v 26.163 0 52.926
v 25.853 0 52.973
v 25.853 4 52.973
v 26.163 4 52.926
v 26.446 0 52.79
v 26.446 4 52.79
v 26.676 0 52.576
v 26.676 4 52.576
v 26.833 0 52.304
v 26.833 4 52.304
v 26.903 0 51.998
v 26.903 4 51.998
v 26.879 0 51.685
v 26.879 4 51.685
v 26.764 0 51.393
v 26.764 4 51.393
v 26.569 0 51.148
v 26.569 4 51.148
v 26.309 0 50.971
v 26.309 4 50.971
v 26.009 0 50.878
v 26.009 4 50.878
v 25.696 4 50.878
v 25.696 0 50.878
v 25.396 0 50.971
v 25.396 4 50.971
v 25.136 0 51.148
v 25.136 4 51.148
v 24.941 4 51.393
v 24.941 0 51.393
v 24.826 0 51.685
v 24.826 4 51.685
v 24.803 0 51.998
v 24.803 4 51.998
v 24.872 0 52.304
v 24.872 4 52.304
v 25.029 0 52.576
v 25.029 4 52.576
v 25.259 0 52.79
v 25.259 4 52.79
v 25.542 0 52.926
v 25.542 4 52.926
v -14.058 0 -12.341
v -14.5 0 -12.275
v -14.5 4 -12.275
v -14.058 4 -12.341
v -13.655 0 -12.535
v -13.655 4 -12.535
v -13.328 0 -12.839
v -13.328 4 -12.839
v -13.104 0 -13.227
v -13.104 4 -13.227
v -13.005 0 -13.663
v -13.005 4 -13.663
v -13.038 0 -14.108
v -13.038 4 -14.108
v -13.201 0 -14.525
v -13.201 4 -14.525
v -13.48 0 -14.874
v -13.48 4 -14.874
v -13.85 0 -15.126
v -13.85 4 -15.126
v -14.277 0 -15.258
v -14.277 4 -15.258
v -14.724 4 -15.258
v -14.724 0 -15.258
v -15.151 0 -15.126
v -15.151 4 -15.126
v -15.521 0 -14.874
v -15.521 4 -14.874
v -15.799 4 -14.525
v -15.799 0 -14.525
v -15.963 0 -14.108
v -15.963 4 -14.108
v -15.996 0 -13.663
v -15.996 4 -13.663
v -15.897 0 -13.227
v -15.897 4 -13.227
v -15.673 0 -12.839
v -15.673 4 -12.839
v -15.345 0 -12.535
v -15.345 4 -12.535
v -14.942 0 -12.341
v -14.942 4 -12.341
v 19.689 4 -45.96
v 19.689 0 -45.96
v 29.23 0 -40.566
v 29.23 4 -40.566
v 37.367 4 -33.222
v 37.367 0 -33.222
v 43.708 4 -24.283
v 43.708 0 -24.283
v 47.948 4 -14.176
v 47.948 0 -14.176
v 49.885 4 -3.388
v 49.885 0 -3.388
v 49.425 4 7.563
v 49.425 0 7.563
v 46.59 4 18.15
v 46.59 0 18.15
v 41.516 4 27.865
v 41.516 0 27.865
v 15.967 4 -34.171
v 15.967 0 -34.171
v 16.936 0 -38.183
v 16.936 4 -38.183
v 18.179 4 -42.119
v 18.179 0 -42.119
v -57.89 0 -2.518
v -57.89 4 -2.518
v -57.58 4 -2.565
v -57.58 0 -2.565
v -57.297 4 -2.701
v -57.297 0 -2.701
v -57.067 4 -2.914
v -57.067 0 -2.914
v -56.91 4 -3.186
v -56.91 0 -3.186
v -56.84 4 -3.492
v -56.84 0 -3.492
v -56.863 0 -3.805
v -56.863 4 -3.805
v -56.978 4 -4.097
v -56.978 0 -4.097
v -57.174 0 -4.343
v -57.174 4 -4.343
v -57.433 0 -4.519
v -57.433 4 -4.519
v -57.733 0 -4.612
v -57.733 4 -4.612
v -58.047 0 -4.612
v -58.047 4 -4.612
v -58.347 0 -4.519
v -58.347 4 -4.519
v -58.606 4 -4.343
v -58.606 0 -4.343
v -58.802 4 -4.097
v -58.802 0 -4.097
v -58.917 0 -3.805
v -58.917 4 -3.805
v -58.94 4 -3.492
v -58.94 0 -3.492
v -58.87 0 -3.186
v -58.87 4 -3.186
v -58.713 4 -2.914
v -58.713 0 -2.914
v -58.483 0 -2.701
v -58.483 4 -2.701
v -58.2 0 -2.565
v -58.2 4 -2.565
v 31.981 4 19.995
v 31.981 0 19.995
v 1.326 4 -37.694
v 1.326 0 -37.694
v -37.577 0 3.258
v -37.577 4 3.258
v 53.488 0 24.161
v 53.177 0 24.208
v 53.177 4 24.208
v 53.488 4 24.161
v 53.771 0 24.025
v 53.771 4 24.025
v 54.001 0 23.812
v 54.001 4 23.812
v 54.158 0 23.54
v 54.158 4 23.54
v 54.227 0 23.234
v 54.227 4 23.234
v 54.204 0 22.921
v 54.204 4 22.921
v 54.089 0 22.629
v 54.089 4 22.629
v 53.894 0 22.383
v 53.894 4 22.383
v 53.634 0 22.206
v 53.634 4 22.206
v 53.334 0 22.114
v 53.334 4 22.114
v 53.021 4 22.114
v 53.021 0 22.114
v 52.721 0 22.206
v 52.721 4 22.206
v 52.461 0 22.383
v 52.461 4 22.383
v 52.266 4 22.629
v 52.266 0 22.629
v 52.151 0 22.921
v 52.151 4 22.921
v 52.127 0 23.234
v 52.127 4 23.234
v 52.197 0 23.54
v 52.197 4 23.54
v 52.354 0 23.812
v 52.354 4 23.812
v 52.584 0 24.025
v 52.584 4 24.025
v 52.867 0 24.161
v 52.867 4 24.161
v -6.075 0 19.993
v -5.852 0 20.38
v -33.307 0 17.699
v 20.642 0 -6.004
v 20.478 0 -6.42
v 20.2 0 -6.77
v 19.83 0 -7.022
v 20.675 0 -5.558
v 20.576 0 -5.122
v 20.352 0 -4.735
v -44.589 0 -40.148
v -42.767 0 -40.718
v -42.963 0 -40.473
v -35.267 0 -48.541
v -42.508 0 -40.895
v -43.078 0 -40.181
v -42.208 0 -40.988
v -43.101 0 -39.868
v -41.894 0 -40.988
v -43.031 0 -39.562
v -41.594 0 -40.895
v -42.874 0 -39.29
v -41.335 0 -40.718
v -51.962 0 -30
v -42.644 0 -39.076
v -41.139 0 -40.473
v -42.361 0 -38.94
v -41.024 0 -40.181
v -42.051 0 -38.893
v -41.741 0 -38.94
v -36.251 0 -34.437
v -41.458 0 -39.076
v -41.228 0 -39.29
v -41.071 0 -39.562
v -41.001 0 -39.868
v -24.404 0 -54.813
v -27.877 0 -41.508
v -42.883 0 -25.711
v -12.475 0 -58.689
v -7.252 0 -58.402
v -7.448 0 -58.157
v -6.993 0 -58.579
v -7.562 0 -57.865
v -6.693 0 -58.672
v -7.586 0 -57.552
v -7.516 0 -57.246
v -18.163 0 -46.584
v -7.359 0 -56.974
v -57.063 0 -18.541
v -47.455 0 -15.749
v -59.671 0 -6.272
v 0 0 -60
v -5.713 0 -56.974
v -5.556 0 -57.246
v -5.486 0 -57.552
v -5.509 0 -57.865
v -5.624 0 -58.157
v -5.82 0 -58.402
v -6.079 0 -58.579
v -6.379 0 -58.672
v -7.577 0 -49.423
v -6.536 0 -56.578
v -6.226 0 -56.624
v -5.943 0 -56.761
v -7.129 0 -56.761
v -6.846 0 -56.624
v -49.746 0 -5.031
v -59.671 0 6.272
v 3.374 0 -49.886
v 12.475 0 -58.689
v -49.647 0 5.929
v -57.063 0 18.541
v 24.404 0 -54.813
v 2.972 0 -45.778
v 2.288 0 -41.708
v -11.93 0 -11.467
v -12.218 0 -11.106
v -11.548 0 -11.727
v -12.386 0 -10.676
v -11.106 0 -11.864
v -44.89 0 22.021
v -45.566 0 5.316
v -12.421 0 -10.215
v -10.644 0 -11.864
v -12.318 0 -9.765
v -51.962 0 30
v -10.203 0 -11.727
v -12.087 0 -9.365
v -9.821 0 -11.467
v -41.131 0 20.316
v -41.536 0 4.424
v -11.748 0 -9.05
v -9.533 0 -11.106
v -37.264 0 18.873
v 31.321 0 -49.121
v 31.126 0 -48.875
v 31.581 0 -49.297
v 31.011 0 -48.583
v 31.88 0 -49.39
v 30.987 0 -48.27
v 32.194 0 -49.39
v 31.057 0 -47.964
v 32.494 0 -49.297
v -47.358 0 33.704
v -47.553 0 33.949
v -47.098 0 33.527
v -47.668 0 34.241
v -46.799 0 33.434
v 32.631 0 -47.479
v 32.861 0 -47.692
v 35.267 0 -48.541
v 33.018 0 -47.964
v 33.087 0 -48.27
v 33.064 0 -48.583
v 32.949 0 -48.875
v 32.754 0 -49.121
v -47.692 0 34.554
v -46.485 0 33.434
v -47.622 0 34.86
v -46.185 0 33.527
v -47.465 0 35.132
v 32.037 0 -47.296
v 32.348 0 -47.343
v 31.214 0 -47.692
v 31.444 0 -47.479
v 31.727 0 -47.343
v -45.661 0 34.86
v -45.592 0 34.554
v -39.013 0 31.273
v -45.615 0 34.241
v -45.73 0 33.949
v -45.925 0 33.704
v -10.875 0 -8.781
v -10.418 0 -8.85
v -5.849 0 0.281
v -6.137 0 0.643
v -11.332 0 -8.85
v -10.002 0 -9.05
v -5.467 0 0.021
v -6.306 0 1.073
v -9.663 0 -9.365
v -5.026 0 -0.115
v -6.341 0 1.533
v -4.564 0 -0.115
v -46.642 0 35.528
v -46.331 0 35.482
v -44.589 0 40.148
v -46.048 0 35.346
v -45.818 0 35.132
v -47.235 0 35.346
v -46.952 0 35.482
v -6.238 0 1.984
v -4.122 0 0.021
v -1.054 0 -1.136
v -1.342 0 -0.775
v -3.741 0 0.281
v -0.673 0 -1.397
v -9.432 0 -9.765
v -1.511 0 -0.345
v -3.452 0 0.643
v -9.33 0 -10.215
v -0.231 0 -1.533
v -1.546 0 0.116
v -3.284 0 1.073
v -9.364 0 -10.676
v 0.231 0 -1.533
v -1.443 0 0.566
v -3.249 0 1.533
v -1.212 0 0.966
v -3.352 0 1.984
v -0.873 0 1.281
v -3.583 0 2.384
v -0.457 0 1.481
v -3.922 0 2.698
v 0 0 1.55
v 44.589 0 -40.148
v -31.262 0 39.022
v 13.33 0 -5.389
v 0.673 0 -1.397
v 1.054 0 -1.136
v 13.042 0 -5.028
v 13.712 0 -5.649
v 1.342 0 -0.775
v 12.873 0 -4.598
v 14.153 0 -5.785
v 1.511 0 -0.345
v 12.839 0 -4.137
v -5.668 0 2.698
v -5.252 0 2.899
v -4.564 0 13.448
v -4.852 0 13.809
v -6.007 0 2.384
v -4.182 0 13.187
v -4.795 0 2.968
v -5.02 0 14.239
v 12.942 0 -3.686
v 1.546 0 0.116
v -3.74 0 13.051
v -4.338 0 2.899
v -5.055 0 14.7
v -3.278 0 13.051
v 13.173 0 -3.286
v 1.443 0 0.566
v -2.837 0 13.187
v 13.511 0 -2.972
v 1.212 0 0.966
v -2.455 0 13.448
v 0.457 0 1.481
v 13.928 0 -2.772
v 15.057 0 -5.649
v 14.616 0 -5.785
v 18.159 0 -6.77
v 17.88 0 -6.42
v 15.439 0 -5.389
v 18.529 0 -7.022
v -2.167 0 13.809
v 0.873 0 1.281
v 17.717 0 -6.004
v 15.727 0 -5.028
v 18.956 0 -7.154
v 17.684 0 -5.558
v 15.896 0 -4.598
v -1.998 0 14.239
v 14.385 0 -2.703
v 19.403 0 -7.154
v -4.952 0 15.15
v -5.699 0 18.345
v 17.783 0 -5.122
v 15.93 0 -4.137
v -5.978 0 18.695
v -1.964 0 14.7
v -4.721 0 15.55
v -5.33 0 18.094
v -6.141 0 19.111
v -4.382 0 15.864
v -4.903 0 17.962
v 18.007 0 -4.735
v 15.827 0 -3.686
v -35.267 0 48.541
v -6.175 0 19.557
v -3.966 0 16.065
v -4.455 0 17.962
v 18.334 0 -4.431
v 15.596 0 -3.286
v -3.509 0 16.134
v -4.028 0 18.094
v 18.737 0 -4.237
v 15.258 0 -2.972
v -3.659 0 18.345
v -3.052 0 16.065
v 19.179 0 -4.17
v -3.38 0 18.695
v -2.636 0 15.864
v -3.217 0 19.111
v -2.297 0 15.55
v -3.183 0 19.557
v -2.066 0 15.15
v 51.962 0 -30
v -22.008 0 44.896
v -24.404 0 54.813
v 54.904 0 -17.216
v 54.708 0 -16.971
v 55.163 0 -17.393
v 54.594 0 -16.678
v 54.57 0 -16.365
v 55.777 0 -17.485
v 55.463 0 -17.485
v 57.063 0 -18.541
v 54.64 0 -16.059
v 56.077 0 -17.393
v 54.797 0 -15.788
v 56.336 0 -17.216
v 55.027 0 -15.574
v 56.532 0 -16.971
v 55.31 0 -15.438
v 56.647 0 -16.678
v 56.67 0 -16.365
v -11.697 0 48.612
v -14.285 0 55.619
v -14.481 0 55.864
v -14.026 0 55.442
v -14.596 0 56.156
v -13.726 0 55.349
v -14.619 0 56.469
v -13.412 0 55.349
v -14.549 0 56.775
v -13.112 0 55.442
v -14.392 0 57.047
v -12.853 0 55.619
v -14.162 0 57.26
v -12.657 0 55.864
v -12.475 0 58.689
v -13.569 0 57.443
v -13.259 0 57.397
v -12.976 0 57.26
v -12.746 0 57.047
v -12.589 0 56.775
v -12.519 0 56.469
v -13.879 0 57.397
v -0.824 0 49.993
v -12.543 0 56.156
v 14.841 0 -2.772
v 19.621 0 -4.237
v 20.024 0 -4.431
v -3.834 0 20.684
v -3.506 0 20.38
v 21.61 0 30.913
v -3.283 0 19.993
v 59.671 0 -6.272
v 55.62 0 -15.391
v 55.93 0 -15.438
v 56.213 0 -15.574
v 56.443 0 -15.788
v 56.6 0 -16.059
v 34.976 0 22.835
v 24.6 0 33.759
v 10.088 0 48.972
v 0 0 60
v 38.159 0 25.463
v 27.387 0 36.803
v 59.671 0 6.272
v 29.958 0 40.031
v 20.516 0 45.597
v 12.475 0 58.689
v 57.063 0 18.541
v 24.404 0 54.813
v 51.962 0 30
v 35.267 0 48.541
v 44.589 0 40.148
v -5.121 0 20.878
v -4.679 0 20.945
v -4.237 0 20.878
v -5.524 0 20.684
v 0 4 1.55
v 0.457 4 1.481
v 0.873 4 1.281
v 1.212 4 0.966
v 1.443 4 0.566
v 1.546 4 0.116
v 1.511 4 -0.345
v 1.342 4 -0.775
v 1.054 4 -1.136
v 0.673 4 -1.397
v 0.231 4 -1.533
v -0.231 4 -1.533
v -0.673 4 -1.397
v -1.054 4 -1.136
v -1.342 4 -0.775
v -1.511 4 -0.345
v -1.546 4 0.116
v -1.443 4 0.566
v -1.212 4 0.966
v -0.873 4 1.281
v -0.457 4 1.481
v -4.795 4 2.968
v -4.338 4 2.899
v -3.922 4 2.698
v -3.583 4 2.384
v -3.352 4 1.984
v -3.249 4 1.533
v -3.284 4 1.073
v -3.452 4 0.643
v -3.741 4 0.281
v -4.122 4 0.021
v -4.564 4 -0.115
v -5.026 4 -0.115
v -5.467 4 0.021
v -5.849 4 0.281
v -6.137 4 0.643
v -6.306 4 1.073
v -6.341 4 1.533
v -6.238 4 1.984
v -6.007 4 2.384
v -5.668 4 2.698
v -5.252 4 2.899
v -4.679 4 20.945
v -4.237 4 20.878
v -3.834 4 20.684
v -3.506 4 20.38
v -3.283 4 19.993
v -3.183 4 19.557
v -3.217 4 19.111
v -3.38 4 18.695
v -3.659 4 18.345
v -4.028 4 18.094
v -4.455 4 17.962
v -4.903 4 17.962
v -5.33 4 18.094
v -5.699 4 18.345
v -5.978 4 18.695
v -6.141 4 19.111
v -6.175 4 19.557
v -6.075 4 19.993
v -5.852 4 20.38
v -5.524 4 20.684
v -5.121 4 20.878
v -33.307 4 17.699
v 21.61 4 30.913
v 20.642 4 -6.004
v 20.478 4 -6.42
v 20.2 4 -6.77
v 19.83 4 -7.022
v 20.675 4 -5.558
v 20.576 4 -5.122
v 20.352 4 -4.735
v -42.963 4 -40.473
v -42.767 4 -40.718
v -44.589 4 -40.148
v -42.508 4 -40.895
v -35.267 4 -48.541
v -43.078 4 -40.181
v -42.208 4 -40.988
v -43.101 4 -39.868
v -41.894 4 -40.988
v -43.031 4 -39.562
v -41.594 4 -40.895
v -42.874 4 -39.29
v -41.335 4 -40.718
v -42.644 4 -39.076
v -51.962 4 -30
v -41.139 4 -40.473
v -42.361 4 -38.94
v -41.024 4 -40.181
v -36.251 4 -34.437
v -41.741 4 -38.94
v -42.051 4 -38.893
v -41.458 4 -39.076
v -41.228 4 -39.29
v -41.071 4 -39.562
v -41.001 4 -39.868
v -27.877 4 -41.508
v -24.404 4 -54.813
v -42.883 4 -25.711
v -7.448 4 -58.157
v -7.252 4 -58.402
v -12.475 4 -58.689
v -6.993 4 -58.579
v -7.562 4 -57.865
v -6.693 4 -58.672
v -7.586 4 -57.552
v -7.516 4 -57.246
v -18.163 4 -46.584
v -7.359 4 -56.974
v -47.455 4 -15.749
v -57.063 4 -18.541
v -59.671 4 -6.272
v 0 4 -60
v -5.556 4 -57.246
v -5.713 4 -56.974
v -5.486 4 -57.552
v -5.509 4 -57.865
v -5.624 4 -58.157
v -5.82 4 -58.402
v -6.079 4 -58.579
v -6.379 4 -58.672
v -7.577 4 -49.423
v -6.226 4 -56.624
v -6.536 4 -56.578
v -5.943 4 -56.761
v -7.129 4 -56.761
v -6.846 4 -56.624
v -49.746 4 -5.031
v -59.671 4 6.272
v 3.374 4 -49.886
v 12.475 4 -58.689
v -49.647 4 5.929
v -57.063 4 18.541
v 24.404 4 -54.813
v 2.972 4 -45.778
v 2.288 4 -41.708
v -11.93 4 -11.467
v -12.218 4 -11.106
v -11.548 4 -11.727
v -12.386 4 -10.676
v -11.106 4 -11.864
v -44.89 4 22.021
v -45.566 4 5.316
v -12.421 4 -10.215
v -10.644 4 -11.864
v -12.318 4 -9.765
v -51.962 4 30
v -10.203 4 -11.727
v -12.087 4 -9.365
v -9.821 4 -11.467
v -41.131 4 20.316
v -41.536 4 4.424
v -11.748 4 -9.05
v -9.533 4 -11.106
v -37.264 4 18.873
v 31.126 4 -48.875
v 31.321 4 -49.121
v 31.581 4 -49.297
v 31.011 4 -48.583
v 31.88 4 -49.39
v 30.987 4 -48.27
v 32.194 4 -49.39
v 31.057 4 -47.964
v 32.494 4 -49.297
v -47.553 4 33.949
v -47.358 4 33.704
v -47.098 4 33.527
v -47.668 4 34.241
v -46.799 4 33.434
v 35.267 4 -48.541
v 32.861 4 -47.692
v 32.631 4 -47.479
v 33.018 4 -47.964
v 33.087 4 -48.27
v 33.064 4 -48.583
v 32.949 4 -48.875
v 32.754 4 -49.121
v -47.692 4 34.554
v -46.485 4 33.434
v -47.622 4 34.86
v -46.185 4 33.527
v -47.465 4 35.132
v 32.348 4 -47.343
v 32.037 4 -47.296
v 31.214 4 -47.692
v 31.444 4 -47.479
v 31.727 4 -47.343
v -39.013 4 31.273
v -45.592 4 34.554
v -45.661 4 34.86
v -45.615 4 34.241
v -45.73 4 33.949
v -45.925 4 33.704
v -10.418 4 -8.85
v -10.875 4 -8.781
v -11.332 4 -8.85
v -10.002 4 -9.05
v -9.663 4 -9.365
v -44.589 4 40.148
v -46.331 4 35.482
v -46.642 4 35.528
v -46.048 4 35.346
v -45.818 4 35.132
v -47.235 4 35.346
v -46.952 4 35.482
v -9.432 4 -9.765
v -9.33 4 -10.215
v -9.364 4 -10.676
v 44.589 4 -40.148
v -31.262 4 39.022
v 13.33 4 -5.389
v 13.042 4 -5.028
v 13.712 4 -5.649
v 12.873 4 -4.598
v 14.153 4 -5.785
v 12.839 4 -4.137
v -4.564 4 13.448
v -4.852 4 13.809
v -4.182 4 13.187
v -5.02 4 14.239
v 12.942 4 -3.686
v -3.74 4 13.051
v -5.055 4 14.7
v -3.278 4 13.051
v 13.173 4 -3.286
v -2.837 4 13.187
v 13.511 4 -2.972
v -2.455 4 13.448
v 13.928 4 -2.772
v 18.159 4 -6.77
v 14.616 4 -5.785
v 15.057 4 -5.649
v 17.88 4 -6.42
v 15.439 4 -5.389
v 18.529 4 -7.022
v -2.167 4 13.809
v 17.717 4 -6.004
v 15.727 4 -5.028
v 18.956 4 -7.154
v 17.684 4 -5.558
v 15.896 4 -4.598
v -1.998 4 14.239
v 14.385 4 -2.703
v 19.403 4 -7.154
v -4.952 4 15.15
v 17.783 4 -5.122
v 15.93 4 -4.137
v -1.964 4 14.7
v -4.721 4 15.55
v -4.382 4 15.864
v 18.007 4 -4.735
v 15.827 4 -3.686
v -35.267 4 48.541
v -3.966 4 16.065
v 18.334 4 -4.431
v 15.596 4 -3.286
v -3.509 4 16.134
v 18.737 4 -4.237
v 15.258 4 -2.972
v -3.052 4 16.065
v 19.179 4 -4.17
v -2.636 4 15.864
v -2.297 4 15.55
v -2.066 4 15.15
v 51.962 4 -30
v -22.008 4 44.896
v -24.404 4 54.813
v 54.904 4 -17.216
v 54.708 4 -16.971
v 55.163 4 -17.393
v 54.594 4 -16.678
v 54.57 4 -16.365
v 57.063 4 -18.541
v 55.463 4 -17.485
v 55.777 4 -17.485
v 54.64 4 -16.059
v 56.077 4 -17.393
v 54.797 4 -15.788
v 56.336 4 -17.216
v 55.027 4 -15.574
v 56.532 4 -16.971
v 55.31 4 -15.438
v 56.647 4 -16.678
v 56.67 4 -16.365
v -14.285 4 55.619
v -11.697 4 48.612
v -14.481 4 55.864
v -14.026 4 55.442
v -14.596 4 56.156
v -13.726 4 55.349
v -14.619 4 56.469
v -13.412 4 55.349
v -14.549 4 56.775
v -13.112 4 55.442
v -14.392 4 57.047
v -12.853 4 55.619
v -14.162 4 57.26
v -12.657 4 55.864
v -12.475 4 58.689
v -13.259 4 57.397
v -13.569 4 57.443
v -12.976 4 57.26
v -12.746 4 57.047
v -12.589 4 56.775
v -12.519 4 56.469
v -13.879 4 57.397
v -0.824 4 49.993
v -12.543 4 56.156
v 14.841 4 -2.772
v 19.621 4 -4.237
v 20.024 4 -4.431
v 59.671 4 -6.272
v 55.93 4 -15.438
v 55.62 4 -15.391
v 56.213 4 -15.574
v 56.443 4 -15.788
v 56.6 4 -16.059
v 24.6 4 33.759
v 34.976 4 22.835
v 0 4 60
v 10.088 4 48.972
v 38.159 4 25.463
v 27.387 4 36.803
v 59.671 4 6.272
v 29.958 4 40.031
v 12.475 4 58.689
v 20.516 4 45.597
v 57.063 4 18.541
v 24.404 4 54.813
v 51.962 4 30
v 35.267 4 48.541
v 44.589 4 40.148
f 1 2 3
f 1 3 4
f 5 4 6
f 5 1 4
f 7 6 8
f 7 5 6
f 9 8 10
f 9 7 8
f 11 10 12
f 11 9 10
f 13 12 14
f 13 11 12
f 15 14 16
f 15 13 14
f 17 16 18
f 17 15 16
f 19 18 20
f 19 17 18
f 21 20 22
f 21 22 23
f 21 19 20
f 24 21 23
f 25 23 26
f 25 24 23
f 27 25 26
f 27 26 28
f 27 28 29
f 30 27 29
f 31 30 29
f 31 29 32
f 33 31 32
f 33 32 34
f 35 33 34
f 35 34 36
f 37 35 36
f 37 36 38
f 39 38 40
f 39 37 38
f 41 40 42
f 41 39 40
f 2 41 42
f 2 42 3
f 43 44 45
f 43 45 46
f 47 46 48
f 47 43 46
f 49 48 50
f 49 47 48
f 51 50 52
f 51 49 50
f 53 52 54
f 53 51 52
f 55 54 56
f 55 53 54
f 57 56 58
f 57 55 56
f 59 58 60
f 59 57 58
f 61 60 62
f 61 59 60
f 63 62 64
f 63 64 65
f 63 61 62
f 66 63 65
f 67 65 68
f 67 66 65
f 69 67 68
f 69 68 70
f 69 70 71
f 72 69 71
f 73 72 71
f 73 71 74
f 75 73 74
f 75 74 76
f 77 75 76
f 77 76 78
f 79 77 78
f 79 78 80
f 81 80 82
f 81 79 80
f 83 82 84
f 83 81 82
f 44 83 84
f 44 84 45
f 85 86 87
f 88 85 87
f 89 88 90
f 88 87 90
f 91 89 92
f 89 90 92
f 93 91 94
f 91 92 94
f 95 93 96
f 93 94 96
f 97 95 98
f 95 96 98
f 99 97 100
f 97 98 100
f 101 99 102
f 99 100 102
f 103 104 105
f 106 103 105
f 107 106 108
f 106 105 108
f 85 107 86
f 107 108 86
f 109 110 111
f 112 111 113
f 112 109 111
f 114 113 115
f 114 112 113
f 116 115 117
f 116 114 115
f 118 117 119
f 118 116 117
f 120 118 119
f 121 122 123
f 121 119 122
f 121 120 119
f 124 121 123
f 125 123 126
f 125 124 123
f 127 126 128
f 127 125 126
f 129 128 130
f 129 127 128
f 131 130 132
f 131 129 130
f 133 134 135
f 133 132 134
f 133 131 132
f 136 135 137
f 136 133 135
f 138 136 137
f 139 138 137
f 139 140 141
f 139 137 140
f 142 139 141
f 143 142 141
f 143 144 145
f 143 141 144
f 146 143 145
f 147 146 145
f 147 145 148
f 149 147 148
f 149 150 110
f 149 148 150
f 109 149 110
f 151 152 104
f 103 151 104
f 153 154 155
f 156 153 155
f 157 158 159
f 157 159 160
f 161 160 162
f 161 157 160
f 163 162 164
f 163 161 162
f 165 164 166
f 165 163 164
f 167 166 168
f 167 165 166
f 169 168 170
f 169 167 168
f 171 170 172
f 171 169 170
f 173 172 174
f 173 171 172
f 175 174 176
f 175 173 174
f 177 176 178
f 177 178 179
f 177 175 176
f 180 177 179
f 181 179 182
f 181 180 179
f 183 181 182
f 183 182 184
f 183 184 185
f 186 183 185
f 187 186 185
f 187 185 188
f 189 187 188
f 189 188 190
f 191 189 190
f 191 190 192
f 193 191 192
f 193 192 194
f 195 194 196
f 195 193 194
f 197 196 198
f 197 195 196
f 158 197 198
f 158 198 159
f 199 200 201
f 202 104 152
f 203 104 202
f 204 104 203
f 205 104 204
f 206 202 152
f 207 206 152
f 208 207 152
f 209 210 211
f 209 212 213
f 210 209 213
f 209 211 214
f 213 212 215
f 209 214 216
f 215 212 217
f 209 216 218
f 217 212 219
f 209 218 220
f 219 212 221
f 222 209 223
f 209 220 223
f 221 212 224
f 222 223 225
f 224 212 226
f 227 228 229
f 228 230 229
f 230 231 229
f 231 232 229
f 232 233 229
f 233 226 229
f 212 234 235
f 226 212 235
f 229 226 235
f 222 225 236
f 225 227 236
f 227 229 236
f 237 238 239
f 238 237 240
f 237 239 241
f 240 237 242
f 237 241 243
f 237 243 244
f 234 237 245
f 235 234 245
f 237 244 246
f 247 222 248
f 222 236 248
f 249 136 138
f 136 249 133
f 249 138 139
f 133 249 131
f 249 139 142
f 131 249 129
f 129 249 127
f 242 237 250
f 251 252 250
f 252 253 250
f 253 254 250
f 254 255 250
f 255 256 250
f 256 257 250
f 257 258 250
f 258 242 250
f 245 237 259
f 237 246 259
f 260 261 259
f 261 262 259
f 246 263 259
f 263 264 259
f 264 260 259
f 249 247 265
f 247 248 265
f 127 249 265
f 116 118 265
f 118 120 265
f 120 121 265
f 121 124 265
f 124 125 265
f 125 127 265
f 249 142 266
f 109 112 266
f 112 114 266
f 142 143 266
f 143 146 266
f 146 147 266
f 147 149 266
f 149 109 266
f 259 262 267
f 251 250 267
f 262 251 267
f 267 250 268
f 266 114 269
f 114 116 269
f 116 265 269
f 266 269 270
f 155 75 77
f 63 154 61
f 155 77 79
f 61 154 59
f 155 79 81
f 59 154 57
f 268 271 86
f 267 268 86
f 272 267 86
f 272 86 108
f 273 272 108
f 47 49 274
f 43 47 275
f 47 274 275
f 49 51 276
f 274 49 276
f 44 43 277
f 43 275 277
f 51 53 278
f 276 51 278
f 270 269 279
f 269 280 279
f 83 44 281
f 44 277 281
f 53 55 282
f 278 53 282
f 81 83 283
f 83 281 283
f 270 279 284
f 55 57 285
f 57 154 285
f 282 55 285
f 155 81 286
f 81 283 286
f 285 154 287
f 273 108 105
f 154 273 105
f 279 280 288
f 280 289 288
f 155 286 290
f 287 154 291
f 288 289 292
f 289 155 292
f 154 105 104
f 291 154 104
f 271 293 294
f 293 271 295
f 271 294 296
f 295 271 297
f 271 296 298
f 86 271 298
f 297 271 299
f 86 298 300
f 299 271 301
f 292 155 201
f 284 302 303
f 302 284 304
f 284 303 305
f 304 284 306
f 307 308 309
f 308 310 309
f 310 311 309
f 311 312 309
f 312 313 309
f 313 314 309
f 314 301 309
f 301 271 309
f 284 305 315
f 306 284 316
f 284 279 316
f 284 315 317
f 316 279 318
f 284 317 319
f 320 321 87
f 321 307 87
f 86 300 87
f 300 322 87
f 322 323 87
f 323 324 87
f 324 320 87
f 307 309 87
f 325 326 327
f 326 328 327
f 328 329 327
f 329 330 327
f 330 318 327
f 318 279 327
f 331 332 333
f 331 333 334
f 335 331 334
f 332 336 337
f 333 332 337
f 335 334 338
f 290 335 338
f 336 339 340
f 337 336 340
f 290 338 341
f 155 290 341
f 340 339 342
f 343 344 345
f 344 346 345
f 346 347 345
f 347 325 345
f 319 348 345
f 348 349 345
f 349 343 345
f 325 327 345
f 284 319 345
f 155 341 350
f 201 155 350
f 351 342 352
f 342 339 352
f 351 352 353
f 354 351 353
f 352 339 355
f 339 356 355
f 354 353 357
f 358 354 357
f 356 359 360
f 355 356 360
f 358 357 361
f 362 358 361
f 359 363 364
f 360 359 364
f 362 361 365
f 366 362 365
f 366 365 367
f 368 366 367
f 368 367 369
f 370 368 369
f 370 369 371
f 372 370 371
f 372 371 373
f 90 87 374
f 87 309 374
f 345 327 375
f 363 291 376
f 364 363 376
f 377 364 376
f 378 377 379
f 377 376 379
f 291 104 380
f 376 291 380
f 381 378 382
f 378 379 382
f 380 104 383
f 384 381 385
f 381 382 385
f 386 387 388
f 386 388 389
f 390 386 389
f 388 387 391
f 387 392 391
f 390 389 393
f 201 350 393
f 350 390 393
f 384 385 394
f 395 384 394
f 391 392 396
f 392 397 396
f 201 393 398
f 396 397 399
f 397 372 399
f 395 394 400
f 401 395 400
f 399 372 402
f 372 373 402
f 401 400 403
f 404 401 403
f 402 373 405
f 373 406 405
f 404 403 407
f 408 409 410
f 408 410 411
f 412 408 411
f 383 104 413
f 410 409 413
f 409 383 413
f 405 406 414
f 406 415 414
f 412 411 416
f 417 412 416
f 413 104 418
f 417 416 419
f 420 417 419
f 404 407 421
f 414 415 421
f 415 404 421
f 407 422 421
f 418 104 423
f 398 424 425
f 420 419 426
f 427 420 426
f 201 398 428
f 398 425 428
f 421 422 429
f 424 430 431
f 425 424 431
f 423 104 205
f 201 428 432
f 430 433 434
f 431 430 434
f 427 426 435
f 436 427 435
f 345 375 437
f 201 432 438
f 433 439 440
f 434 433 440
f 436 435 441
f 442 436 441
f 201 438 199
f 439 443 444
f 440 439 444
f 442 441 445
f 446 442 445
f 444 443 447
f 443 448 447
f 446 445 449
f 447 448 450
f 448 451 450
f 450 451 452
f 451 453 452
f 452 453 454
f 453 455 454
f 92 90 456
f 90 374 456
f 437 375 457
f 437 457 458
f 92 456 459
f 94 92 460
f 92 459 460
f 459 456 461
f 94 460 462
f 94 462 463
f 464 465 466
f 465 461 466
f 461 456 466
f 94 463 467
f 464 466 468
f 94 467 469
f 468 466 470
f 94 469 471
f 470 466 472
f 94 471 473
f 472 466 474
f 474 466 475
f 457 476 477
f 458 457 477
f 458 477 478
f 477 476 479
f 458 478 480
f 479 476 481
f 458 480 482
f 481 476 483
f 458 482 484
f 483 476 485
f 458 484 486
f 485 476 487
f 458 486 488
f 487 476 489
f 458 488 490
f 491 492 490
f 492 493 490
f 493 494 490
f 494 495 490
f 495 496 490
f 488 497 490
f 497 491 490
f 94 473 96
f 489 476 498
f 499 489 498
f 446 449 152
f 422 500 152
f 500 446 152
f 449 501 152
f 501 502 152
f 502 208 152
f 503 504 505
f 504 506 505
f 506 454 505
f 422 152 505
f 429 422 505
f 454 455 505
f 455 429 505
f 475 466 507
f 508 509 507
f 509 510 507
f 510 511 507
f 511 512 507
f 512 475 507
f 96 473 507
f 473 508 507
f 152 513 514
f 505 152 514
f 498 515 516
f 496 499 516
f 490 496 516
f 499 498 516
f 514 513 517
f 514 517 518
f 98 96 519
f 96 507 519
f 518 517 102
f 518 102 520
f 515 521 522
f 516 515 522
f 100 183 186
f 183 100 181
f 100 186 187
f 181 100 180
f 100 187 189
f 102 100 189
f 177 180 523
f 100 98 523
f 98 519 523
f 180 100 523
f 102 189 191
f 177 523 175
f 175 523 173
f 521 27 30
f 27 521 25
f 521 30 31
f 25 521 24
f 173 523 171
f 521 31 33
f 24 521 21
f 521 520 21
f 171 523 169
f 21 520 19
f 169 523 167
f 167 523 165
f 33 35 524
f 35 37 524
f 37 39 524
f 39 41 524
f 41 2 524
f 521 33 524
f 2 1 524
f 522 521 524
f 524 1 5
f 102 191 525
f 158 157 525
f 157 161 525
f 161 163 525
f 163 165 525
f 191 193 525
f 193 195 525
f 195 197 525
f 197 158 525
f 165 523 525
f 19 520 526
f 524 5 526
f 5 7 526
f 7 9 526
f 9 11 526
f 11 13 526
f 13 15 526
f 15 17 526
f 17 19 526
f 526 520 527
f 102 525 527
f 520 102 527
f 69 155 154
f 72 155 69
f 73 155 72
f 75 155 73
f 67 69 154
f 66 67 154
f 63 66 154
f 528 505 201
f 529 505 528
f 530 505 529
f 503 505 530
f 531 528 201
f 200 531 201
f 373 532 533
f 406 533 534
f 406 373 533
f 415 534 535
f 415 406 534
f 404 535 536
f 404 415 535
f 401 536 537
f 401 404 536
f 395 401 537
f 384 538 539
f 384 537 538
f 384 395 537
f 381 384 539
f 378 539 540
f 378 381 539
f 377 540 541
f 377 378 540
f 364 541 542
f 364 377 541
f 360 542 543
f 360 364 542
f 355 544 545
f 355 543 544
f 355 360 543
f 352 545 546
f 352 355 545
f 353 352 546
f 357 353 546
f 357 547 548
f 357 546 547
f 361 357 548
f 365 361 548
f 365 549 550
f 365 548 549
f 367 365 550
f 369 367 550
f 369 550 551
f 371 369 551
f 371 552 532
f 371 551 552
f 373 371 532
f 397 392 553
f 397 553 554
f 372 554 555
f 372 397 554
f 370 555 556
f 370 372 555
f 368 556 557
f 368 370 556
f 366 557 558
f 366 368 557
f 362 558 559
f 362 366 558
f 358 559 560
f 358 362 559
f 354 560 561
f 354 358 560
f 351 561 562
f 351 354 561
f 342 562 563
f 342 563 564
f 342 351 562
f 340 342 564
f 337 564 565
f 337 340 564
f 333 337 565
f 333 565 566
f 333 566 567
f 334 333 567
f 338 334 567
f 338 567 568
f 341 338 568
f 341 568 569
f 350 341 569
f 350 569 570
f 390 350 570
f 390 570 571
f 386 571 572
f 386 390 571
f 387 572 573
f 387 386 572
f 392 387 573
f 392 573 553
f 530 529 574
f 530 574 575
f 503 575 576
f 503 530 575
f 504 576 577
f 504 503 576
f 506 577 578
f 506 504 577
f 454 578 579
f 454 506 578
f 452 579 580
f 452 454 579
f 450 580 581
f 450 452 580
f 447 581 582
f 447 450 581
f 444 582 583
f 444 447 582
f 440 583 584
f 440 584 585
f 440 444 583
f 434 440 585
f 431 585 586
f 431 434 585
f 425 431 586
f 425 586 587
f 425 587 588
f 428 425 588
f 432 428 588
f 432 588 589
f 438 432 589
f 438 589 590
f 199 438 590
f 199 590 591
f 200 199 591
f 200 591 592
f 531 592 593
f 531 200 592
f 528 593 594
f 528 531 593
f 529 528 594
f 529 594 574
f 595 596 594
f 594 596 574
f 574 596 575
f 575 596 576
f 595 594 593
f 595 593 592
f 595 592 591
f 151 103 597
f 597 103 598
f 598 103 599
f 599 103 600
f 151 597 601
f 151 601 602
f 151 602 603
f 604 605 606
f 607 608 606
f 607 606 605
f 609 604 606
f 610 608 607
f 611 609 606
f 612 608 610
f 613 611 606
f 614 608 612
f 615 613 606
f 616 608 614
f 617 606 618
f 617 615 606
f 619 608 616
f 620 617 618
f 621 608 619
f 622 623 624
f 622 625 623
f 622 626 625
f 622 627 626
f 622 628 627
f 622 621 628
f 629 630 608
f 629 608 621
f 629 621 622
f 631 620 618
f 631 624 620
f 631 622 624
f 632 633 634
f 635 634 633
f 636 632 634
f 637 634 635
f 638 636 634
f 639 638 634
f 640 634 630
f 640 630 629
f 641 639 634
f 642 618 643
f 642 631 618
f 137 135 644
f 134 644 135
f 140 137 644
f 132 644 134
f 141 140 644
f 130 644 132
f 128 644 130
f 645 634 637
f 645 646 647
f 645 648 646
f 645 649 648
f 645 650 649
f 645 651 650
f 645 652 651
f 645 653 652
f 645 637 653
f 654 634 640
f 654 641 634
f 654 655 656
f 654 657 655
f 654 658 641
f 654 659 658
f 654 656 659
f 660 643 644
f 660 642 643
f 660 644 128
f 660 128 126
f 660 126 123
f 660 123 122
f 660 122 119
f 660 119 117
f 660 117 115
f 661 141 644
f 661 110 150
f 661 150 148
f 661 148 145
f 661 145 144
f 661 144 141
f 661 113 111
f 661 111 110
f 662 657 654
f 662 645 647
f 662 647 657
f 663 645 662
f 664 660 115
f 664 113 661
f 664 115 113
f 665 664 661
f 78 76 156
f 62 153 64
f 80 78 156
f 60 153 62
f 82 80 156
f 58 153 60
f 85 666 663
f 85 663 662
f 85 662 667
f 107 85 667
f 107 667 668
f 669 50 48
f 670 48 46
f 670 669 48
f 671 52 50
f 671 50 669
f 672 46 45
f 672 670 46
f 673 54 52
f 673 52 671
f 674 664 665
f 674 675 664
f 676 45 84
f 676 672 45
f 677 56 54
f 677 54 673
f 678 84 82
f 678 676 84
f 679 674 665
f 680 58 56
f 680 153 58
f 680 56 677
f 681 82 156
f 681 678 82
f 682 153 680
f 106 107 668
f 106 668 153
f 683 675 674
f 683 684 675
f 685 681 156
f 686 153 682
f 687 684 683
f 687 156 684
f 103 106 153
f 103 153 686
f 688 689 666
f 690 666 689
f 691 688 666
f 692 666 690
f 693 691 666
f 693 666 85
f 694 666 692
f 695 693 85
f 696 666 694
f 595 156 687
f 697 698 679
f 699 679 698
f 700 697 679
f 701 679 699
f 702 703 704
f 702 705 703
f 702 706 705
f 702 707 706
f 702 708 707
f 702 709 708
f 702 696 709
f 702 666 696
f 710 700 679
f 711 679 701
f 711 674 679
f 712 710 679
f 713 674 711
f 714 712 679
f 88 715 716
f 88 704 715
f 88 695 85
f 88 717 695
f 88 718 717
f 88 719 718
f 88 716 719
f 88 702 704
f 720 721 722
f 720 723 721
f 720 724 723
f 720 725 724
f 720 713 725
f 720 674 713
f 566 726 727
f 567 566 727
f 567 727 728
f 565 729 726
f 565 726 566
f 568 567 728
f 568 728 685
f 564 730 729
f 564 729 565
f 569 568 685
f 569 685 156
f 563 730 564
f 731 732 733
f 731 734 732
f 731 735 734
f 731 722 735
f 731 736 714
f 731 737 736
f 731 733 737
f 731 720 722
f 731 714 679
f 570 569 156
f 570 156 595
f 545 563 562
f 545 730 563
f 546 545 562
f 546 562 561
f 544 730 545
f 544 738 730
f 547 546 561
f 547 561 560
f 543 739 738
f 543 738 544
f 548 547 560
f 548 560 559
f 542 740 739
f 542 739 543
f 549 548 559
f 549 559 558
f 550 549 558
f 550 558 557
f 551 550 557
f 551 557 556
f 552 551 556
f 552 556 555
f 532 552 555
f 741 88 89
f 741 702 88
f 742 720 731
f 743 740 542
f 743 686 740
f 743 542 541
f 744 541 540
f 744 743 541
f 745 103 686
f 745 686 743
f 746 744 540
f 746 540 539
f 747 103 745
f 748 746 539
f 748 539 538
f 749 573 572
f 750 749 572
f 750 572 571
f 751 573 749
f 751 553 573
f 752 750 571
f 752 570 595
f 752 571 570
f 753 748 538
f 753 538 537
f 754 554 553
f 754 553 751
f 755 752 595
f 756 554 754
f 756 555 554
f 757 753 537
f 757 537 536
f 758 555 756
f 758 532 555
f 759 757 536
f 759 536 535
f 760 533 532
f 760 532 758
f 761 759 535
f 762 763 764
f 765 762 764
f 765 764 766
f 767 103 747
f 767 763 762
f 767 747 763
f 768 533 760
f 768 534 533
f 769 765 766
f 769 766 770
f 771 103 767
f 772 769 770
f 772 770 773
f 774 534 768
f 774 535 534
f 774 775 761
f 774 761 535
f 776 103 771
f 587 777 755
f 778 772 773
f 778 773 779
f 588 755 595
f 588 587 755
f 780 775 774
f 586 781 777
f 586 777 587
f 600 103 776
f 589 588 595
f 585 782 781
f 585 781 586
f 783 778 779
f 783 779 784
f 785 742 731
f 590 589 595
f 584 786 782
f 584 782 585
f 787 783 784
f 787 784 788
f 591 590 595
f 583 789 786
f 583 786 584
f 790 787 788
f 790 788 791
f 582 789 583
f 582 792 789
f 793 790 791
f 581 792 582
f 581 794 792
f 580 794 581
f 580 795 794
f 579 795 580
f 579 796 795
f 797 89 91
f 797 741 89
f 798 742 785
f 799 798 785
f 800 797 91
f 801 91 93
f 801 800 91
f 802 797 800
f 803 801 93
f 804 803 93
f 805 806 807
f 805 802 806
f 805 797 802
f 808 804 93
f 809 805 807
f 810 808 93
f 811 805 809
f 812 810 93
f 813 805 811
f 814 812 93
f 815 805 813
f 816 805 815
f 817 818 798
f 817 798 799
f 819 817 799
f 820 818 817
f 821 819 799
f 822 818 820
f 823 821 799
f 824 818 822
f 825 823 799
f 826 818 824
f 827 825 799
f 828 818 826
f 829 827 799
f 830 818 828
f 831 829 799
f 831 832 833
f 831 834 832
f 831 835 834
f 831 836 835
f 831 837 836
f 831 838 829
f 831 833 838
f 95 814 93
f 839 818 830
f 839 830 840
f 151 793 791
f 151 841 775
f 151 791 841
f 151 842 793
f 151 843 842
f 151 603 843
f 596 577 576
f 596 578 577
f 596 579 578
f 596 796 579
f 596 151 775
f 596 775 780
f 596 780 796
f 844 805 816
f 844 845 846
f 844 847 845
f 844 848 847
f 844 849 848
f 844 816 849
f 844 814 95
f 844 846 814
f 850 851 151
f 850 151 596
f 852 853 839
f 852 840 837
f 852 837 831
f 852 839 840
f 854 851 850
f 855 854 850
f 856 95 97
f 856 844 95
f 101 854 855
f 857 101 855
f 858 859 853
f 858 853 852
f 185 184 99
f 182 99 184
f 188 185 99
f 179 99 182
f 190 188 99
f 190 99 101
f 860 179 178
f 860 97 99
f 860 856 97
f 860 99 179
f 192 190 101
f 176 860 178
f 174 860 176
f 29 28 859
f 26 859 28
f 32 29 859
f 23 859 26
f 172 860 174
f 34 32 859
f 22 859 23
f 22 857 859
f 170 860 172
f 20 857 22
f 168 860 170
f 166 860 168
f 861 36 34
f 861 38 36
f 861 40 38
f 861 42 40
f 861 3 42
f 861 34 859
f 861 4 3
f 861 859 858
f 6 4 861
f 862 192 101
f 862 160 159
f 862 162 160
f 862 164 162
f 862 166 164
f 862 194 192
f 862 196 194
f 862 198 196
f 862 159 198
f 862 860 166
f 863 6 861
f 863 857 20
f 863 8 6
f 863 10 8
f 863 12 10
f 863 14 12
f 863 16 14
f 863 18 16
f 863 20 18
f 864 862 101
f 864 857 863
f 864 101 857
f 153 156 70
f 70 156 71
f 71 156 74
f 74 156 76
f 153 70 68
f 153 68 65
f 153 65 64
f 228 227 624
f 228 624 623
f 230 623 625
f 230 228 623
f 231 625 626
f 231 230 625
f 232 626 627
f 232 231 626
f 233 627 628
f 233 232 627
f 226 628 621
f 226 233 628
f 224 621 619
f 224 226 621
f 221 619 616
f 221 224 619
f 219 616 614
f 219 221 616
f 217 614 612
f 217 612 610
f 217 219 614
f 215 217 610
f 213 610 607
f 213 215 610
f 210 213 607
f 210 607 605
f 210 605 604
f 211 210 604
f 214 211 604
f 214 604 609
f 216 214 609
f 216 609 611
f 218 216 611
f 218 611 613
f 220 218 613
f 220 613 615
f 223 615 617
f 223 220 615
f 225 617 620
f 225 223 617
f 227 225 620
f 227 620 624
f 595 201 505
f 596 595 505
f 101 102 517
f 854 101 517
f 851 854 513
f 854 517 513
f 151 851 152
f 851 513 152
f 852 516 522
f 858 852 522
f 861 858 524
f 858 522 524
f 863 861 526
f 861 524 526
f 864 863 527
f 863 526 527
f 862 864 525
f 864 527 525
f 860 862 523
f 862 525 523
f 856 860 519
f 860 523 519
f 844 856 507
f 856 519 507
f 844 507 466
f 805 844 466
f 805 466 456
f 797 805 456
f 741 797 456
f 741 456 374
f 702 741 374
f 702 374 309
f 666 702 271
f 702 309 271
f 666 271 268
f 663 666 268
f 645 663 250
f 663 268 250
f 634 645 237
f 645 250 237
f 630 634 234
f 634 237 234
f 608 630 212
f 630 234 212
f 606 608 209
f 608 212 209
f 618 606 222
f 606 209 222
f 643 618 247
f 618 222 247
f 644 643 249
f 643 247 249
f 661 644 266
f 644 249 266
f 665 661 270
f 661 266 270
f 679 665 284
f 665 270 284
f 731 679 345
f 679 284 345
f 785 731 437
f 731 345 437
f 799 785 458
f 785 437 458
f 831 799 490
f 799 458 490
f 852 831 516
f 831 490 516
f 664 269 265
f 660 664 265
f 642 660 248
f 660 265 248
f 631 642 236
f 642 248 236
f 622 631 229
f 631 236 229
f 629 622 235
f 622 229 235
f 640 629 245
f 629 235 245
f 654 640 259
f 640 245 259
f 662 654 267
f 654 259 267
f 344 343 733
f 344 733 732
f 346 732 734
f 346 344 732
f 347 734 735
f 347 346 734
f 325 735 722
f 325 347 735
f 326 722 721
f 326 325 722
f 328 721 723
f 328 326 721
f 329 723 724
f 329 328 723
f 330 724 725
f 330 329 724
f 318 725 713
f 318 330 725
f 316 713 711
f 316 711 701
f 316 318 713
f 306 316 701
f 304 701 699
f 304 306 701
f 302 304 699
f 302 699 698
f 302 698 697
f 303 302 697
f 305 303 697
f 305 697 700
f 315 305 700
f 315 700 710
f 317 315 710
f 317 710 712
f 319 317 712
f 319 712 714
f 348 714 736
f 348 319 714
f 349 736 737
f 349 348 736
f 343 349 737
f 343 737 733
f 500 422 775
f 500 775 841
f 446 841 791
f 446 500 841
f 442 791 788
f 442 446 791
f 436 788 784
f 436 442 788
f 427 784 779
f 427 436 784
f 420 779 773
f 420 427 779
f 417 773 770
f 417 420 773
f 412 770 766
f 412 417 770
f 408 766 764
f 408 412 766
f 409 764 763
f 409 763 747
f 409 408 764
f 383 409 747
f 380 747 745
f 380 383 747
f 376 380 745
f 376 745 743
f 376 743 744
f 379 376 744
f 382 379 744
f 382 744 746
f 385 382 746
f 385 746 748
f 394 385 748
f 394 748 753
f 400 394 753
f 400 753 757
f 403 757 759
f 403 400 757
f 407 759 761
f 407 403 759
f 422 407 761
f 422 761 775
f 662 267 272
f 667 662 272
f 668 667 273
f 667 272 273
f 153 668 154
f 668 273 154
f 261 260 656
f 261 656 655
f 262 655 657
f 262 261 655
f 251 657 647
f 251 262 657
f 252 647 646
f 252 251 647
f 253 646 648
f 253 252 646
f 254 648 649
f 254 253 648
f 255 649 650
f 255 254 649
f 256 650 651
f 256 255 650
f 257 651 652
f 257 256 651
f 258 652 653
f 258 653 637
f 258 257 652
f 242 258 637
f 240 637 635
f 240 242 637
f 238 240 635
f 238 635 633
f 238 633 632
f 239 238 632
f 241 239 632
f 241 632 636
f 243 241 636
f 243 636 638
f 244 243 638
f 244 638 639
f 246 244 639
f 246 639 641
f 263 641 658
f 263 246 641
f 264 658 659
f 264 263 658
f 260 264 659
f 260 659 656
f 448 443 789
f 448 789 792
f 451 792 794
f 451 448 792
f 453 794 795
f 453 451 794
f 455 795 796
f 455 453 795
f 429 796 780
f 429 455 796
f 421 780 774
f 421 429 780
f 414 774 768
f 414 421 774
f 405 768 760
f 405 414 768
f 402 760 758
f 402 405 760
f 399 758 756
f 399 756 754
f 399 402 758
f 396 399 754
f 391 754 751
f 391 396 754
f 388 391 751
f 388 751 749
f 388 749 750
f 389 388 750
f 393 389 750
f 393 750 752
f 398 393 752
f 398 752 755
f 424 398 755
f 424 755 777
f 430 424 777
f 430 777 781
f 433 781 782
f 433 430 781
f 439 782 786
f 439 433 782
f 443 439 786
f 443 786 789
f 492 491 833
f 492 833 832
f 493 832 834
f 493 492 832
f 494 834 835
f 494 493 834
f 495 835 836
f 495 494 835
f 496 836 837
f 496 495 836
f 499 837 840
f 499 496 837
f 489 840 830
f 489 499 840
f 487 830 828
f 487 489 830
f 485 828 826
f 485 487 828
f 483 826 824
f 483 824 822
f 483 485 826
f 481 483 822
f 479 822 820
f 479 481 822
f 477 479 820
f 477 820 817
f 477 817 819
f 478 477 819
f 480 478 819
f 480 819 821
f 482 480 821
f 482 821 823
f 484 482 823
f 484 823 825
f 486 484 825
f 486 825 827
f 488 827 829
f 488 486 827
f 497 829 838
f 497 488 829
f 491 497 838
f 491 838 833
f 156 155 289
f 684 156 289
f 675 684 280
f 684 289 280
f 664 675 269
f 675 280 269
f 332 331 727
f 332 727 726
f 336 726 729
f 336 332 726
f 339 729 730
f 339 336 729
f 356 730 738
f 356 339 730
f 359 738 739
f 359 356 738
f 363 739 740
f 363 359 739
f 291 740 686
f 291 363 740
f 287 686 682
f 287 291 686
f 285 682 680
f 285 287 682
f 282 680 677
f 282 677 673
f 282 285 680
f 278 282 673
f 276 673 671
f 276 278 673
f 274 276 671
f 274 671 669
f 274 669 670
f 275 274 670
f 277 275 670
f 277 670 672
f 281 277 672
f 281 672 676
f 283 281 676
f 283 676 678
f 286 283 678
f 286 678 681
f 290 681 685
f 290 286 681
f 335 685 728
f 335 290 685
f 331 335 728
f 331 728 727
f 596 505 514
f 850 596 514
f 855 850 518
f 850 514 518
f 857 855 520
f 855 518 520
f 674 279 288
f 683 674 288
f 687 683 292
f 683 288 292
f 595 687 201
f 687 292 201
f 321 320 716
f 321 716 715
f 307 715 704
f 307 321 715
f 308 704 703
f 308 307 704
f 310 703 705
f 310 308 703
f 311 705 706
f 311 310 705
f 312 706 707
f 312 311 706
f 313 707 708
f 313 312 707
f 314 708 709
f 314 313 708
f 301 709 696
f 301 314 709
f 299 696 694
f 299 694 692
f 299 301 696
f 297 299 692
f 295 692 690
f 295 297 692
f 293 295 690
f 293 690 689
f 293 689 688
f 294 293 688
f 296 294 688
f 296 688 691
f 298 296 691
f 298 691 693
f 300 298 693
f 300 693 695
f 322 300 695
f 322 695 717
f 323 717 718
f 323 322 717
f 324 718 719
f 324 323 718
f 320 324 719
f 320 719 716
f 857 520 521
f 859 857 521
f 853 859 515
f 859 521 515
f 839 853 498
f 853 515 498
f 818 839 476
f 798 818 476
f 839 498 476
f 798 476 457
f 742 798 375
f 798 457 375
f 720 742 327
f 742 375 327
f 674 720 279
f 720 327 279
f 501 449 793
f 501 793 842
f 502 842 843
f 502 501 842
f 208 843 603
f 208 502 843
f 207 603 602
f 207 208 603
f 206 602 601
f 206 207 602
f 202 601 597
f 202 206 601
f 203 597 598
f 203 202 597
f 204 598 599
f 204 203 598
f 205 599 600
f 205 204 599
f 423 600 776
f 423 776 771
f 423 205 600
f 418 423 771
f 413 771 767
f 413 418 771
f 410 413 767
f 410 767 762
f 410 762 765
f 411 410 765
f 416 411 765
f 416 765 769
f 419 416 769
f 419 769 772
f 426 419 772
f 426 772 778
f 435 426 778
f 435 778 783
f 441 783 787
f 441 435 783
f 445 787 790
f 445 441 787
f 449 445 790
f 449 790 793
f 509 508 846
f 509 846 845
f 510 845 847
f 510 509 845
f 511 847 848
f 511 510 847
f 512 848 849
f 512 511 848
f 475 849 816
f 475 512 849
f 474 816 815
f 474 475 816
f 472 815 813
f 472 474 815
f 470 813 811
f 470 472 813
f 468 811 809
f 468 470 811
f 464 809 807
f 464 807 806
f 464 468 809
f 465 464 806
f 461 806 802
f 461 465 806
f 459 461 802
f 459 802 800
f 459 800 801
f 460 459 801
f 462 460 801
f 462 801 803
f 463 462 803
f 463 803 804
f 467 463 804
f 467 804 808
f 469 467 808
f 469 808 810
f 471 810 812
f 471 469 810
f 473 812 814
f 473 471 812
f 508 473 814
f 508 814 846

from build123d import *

# Parameters (mm, degrees)
SKETCH_3_R           = 60
SKETCH_3_R_2         = 1.052935028
SKETCH_3_R_3         = 1.5
SKETCH_3_R_4         = 1.55
EXTRUDE_4_DEPTH      = 4
CUT_EXTRUDE_15_DEPTH = 4
SKETCH_3_22_R        = 1.55
CUT_EXTRUDE_23_DEPTH = 10
SKETCH_3_23_R        = 1.052935028
CUT_EXTRUDE_24_DEPTH = 10


with BuildPart() as part:
    # 草图3 → 凸台-拉伸4 (new body)
    with BuildSketch(Plane(origin=(0, 0, 0), x_dir=(1, 0, 0), z_dir=(0, 1, 0))):
        with Locations(Location((0, 0, 0), (0, 0, 270))):
            Circle(SKETCH_3_R)
        with Locations(Location((-46.641583195, -34.475537952, 0), (0, 0, 270))):
            Circle(SKETCH_3_R_2, mode=Mode.SUBTRACT)
        with Locations(Location((-13.569076992, -56.390426045, 0), (0, 0, 270))):
            Circle(SKETCH_3_R_2, mode=Mode.SUBTRACT)
        with BuildLine():
            ThreePointArc((-44.889569885, -22.021047103), (-39.209954392, -19.560908928), (-33.307112163, -17.698983687))
            Line((-33.307112163, -17.698983687), (21.609631998, -30.913452559))
            ThreePointArc((21.609631998, -30.913452559), (26.019303967, -35.256850436), (29.958048994, -40.031428909))
            ThreePointArc((29.958048994, -40.031428909), (-11.697480165, -48.612436246), (-44.889569885, -22.021047103))
        make_face(mode=Mode.SUBTRACT)
        with Locations(Location((-4.678992066, -19.444974498, 0), (0, 0, 270))):
            Circle(SKETCH_3_R_3, mode=Mode.SUBTRACT)
        with Locations(Location((-3.50924405, -14.583730874, 0), (0, 0, 270))):
            Circle(SKETCH_3_R_4, mode=Mode.SUBTRACT)
        with Locations(Location((-4.794834481, -1.417590314, 0), (0, 0, 270))):
            Circle(SKETCH_3_R_4, mode=Mode.SUBTRACT)
        with Locations(Location((25.852551139, -51.919607083, 0), (0, 0, 270))):
            Circle(SKETCH_3_R_2, mode=Mode.SUBTRACT)
        with Locations(Location((53.177483273, -23.155026944, 0), (0, 0, 270))):
            Circle(SKETCH_3_R_2, mode=Mode.SUBTRACT)
        with Locations(Location((-10.875259394, 10.330959932, 0), (0, 0, 270))):
            Circle(SKETCH_3_R_4, mode=Mode.SUBTRACT)
        with Locations(Location((-14.500345858, 13.774613243, 0), (0, 0, 270))):
            Circle(SKETCH_3_R_3, mode=Mode.SUBTRACT)
        with BuildLine():
            ThreePointArc((15.967019236, 34.171216556), (17.523676152, 40.161803442), (19.689209887, 45.960145931))
            ThreePointArc((19.689209887, 45.960145931), (47.948344812, 14.175903139), (41.515571152, -27.864984334))
            ThreePointArc((41.515571152, -27.864984334), (36.545221249, -24.176362121), (31.981325576, -19.995313417))
            Line((31.981325576, -19.995313417), (15.967019236, 34.171216556))
        make_face(mode=Mode.SUBTRACT)
        with Locations(Location((55.620079982, 16.444047642, 0), (0, 0, 270))):
            Circle(SKETCH_3_R_2, mode=Mode.SUBTRACT)
        with Locations(Location((32.037423118, 48.34876958, 0), (0, 0, 270))):
            Circle(SKETCH_3_R_2, mode=Mode.SUBTRACT)
        with Locations(Location((-42.05100299, 39.946378404, 0), (0, 0, 270))):
            Circle(SKETCH_3_R_2, mode=Mode.SUBTRACT)
        with Locations(Location((-6.535900078, 57.630564895, 0), (0, 0, 270))):
            Circle(SKETCH_3_R_2, mode=Mode.SUBTRACT)
        with Locations(Location((14.384503444, 4.252770942, 0), (0, 0, 270))):
            Circle(SKETCH_3_R_4, mode=Mode.SUBTRACT)
        with Locations(Location((19.179337925, 5.670361256, 0), (0, 0, 270))):
            Circle(SKETCH_3_R_3, mode=Mode.SUBTRACT)
    extrude(amount=EXTRUDE_4_DEPTH)

    # 草图3<17> → 切除-拉伸15 (cut)
    with BuildSketch(Plane(origin=(0, 0, 0), x_dir=(1, 0, 0), z_dir=(0, 1, 0))):
        with BuildLine():
            Line((1.325786588, 37.694297104), (-37.576651234, -3.257763997))
            ThreePointArc((-37.576651234, -3.257763997), (-43.542980118, -4.904953006), (-49.647258882, -5.928717023))
            ThreePointArc((-49.647258882, -5.928717023), (-36.250864646, 34.436533107), (3.373998733, 49.886031437))
            ThreePointArc((3.373998733, 49.886031437), (2.664733143, 43.737271049), (1.325786588, 37.694297104))
        make_face()
    extrude(amount=CUT_EXTRUDE_15_DEPTH, mode=Mode.SUBTRACT)

    # 草图3<22> → 切除-拉伸23 (cut)
    with BuildSketch(Plane(origin=(0, 0, 0), x_dir=(1, 0, 0), z_dir=(0, 1, 0))):
        with Locations(Location((0, 0, 0), (0, 0, 270))):
            Circle(SKETCH_3_22_R)
    extrude(amount=CUT_EXTRUDE_23_DEPTH, mode=Mode.SUBTRACT)

    # 草图3<23> → 切除-拉伸24 (cut)
    with BuildSketch(Plane(origin=(0, 0, 0), x_dir=(1, 0, 0), z_dir=(0, 1, 0))):
        with Locations(Location((-57.889974257, 3.570837502, 0), (0, 0, 270))):
            Circle(SKETCH_3_23_R)
    extrude(amount=CUT_EXTRUDE_24_DEPTH, mode=Mode.SUBTRACT)


solid = part.part
